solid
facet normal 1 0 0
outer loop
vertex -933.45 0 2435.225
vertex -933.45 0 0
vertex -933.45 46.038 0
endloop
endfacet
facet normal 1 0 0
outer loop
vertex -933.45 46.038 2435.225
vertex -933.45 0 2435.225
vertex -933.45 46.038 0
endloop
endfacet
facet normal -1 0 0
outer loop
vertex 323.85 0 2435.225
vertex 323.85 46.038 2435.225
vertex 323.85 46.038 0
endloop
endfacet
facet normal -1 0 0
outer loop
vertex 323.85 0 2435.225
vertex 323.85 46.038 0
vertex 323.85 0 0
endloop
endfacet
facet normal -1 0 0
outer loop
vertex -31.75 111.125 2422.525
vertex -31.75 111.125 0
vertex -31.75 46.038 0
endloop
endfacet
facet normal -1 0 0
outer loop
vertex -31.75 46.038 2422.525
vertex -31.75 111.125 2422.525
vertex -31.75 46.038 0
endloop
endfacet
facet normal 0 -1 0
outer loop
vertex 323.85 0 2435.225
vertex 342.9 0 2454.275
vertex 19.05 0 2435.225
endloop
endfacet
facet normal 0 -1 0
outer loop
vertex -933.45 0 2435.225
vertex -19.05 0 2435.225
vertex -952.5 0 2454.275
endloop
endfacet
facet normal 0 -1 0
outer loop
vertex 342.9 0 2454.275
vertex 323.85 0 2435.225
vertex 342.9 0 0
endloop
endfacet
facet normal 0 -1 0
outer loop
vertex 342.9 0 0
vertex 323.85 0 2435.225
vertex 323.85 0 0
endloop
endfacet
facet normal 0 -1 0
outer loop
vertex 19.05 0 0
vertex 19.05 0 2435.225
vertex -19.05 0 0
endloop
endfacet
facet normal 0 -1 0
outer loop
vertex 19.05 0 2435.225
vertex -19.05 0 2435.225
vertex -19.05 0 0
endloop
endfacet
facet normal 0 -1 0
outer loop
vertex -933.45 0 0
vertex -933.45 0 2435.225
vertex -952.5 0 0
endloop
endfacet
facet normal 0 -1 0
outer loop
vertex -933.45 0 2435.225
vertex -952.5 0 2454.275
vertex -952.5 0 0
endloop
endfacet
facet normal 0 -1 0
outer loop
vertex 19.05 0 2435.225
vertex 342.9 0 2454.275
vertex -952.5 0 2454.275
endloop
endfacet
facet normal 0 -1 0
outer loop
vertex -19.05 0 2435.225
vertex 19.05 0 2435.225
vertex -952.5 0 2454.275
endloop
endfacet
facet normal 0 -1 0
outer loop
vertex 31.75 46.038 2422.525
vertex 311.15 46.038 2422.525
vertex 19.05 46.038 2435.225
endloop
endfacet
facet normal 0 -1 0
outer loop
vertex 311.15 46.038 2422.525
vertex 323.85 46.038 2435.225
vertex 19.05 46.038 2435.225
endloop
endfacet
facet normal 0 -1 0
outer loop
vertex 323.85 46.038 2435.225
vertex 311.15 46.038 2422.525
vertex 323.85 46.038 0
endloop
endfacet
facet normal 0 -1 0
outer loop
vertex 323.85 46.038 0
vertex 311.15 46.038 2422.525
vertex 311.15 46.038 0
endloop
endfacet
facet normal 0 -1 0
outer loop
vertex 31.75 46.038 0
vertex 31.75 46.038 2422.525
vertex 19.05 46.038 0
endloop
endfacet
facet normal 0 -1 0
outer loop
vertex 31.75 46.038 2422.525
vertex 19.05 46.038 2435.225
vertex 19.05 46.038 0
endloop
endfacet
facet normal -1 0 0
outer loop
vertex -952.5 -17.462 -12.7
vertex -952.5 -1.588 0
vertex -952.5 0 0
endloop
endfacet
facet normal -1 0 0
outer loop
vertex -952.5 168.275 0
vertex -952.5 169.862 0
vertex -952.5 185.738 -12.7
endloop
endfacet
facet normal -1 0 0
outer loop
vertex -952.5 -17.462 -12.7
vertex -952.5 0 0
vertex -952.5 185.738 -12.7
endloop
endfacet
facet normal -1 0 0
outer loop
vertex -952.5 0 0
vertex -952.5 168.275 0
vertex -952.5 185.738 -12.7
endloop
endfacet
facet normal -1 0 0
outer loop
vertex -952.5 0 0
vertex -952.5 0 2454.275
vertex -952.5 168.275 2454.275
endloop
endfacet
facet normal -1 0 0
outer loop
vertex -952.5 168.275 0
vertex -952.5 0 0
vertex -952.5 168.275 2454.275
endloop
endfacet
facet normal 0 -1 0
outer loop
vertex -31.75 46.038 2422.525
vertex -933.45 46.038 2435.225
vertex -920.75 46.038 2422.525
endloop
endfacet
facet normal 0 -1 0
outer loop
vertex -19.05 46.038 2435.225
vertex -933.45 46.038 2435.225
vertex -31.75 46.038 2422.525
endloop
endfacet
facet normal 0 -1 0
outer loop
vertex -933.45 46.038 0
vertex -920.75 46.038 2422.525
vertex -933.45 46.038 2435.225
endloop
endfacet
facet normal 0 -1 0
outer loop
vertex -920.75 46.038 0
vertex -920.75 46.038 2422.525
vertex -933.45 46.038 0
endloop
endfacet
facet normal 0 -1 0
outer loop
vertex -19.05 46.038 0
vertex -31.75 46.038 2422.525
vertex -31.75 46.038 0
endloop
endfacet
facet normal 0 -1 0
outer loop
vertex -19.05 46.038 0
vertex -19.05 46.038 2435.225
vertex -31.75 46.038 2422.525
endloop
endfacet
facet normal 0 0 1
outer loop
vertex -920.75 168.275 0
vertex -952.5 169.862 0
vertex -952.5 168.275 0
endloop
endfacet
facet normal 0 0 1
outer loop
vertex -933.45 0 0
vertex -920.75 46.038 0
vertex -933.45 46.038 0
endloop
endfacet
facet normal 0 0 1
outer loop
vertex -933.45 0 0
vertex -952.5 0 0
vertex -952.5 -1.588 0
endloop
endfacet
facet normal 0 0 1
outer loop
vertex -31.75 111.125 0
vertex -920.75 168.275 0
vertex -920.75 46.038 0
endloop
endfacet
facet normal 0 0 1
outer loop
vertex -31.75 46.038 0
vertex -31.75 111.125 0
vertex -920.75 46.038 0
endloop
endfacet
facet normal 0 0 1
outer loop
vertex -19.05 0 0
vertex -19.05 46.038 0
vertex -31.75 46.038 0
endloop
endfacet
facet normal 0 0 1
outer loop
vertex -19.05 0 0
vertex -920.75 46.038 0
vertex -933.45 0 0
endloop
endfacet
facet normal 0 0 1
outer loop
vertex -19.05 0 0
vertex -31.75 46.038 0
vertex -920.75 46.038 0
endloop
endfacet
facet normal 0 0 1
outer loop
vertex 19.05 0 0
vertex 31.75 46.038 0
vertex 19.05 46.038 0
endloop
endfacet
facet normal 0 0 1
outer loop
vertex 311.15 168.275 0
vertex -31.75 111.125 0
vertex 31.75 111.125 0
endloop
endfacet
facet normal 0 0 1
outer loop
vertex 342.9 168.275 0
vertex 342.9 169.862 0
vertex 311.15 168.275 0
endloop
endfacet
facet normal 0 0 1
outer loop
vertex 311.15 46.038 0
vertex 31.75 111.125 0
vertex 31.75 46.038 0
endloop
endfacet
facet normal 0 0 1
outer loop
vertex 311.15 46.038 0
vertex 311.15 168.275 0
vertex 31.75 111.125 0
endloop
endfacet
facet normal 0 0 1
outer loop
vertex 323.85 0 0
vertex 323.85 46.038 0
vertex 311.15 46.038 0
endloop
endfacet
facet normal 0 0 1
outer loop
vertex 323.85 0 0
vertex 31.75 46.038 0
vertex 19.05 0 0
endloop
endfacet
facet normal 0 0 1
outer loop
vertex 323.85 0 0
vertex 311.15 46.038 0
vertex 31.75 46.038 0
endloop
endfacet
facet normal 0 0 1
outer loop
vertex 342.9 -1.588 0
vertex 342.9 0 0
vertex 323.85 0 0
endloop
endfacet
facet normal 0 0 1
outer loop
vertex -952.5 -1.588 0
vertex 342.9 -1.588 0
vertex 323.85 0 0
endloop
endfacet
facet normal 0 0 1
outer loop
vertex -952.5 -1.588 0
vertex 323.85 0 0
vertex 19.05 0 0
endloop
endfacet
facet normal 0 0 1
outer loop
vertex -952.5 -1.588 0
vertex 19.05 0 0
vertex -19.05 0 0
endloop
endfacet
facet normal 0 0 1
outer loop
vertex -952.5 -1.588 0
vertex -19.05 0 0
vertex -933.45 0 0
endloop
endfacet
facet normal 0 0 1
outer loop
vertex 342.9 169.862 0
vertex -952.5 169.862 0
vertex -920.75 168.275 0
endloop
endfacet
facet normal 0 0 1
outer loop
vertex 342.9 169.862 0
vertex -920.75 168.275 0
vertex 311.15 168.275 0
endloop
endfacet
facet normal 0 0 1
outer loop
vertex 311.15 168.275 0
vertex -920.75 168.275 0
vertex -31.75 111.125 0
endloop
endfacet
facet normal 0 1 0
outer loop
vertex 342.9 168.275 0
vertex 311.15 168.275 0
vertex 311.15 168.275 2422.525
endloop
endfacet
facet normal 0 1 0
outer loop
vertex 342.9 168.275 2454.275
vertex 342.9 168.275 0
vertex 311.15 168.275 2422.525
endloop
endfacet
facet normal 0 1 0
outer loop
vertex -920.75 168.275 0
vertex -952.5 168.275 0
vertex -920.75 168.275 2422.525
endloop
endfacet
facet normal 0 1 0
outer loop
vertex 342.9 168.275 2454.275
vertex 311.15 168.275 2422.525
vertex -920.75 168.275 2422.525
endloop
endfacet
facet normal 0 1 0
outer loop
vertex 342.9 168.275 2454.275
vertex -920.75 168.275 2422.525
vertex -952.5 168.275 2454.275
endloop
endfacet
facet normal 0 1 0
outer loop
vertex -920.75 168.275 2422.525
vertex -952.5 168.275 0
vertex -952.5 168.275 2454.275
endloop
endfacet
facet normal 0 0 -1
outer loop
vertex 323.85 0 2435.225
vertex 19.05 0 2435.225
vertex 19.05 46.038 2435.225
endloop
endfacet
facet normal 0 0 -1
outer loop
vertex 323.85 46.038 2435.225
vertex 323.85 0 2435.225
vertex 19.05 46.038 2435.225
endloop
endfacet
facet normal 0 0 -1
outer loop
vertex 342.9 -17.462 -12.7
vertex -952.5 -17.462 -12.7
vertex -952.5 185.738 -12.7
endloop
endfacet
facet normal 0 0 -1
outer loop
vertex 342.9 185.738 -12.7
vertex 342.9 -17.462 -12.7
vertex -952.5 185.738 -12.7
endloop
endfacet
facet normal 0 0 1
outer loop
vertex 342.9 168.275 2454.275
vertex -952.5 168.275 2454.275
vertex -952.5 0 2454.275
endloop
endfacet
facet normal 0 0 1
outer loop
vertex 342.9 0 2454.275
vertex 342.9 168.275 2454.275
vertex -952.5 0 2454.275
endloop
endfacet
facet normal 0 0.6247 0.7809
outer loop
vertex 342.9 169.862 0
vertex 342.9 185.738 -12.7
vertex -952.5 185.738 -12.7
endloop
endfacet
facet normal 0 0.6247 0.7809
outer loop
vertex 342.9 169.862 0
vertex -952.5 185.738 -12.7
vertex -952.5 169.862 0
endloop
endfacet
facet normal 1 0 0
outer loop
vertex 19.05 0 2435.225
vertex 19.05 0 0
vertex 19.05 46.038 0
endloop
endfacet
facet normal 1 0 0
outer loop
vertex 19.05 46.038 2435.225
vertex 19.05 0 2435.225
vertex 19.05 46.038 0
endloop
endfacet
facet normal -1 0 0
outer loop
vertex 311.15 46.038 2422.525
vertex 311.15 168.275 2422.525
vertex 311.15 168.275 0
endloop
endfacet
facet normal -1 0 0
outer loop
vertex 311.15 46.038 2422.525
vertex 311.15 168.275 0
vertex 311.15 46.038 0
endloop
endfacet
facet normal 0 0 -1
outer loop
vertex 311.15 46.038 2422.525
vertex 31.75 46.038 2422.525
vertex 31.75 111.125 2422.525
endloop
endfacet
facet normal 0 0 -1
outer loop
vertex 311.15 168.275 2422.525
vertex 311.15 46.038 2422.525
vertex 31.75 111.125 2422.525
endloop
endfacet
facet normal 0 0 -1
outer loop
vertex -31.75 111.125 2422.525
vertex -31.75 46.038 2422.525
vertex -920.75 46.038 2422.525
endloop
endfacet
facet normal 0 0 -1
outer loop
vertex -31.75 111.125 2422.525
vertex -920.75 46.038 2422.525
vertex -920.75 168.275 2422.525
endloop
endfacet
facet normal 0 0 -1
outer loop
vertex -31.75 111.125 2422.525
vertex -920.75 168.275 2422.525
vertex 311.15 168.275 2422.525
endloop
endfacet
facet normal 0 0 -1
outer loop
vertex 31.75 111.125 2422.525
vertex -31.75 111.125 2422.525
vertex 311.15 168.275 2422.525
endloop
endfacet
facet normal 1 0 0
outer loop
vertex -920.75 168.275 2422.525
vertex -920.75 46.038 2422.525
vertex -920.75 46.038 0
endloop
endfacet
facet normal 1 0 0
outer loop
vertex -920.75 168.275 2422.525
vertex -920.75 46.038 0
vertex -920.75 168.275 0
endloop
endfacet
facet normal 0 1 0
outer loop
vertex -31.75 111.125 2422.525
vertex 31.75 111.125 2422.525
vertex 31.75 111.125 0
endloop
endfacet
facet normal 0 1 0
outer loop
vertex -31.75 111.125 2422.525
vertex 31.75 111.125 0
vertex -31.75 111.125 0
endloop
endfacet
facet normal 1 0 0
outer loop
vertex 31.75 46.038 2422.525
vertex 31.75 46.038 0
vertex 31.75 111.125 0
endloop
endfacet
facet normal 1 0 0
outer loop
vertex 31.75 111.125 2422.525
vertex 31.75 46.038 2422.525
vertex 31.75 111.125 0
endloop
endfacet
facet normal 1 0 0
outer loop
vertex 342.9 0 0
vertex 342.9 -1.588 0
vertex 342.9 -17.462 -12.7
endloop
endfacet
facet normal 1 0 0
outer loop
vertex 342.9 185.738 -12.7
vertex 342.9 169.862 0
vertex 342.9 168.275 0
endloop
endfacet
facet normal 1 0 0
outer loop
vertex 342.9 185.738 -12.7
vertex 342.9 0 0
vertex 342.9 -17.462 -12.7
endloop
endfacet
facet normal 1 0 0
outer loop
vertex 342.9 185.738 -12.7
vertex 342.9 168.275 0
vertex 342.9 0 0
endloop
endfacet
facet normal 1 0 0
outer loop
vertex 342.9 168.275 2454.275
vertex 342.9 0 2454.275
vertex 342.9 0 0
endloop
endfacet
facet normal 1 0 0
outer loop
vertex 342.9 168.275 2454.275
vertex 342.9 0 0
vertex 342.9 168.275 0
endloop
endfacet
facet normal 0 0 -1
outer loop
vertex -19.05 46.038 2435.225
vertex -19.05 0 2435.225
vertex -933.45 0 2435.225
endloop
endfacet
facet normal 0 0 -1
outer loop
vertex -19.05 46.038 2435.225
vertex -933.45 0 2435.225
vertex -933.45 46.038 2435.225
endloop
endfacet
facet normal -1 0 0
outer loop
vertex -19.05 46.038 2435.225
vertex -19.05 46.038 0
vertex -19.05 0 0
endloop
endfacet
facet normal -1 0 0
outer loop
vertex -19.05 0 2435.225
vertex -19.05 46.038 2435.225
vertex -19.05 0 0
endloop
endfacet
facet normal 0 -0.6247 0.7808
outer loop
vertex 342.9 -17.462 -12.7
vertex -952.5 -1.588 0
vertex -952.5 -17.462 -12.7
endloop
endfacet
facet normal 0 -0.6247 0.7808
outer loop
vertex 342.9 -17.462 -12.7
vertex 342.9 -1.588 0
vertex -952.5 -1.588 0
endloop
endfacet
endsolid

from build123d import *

# Parameters (mm, degrees)
F2_DEPTH      = 2454.275
F4_DEPTH      = 168.276
F6_DEPTH      = 952.5
F6_DEPTH_BACK = 342.9
F8_DEPTH      = 342.9
F8_DEPTH_BACK = 952.5


with BuildPart() as f2:
    # F1 (on Top) → F2 (new body)
    with BuildSketch(Plane.XY):
        Polygon((-952.5, 168.275), (-952.5, 0), (-933.45, 0), (-933.45, 46.0375), (-920.75, 46.0375), (-920.75, 168.275), align=None)
    extrude(amount=F2_DEPTH)


with BuildPart() as f2b:
    # F1 (on Top) → F2, piece 2 (new body)
    with BuildSketch(Plane.XY):
        Polygon((-31.75, 46.0375), (-19.05, 46.0375), (-19.05, 0), (19.05, 0), (19.05, 46.0375), (31.75, 46.0375), (31.75, 111.125), (-31.75, 111.125), align=None)
    extrude(amount=F2_DEPTH)


with BuildPart() as f2c:
    # F1 (on Top) → F2, piece 3 (new body)
    with BuildSketch(Plane.XY):
        Polygon((311.15, 46.0375), (323.85, 46.0375), (323.85, 0), (342.9, 0), (342.9, 168.275), (311.15, 168.275), align=None)
    extrude(amount=F2_DEPTH)


with BuildPart() as f4_tool:
    # F3 (on Front) → F4 (new body, through all)
    with BuildSketch(Plane.XZ):
        Polygon((-31.75, 2454.275), (-952.5, 2454.275), (-492.125, 1993.9), align=None)
        Polygon((342.9, 2454.275), (31.75, 2454.275), (187.325, 2298.7), align=None)
    extrude(amount=-F4_DEPTH)


with BuildPart() as f2_1:
    add(f2.part)

    # F4: cut by f4_tool
    add(f4_tool.part, mode=Mode.SUBTRACT)


    add(f2b.part)  # F6 merges F2b


with BuildPart() as f2c_1:
    add(f2c.part)

    # F4: cut by f4_tool
    add(f4_tool.part, mode=Mode.SUBTRACT)


with BuildPart() as f2_2:
    add(f2_1.part)

    add(f2c_1.part)  # F6 merges F2c
    # F5 (on Right) → F6 (join, two sides)
    with BuildSketch(Plane.YZ) as f6_sk:
        Polygon((168.275, 2422.525), (168.275, 2454.275), (0, 2454.275), (0, 2435.225), (46.0375, 2435.225), (46.0375, 2422.525), align=None)
    extrude(amount=-F6_DEPTH)
    extrude(f6_sk.sketch, amount=F6_DEPTH_BACK)

    # F7 (on Right) → F8 (join, two sides)
    with BuildSketch(Plane.YZ) as f8_sk:
        Polygon((-17.4625, -12.7), (84.1375, -12.7), (185.7375, -12.7), (169.8625, 0), (84.1375, 0), (-1.5875, 0), align=None)
    extrude(amount=F8_DEPTH)
    extrude(f8_sk.sketch, amount=-F8_DEPTH_BACK)


solid = f2_2.part
